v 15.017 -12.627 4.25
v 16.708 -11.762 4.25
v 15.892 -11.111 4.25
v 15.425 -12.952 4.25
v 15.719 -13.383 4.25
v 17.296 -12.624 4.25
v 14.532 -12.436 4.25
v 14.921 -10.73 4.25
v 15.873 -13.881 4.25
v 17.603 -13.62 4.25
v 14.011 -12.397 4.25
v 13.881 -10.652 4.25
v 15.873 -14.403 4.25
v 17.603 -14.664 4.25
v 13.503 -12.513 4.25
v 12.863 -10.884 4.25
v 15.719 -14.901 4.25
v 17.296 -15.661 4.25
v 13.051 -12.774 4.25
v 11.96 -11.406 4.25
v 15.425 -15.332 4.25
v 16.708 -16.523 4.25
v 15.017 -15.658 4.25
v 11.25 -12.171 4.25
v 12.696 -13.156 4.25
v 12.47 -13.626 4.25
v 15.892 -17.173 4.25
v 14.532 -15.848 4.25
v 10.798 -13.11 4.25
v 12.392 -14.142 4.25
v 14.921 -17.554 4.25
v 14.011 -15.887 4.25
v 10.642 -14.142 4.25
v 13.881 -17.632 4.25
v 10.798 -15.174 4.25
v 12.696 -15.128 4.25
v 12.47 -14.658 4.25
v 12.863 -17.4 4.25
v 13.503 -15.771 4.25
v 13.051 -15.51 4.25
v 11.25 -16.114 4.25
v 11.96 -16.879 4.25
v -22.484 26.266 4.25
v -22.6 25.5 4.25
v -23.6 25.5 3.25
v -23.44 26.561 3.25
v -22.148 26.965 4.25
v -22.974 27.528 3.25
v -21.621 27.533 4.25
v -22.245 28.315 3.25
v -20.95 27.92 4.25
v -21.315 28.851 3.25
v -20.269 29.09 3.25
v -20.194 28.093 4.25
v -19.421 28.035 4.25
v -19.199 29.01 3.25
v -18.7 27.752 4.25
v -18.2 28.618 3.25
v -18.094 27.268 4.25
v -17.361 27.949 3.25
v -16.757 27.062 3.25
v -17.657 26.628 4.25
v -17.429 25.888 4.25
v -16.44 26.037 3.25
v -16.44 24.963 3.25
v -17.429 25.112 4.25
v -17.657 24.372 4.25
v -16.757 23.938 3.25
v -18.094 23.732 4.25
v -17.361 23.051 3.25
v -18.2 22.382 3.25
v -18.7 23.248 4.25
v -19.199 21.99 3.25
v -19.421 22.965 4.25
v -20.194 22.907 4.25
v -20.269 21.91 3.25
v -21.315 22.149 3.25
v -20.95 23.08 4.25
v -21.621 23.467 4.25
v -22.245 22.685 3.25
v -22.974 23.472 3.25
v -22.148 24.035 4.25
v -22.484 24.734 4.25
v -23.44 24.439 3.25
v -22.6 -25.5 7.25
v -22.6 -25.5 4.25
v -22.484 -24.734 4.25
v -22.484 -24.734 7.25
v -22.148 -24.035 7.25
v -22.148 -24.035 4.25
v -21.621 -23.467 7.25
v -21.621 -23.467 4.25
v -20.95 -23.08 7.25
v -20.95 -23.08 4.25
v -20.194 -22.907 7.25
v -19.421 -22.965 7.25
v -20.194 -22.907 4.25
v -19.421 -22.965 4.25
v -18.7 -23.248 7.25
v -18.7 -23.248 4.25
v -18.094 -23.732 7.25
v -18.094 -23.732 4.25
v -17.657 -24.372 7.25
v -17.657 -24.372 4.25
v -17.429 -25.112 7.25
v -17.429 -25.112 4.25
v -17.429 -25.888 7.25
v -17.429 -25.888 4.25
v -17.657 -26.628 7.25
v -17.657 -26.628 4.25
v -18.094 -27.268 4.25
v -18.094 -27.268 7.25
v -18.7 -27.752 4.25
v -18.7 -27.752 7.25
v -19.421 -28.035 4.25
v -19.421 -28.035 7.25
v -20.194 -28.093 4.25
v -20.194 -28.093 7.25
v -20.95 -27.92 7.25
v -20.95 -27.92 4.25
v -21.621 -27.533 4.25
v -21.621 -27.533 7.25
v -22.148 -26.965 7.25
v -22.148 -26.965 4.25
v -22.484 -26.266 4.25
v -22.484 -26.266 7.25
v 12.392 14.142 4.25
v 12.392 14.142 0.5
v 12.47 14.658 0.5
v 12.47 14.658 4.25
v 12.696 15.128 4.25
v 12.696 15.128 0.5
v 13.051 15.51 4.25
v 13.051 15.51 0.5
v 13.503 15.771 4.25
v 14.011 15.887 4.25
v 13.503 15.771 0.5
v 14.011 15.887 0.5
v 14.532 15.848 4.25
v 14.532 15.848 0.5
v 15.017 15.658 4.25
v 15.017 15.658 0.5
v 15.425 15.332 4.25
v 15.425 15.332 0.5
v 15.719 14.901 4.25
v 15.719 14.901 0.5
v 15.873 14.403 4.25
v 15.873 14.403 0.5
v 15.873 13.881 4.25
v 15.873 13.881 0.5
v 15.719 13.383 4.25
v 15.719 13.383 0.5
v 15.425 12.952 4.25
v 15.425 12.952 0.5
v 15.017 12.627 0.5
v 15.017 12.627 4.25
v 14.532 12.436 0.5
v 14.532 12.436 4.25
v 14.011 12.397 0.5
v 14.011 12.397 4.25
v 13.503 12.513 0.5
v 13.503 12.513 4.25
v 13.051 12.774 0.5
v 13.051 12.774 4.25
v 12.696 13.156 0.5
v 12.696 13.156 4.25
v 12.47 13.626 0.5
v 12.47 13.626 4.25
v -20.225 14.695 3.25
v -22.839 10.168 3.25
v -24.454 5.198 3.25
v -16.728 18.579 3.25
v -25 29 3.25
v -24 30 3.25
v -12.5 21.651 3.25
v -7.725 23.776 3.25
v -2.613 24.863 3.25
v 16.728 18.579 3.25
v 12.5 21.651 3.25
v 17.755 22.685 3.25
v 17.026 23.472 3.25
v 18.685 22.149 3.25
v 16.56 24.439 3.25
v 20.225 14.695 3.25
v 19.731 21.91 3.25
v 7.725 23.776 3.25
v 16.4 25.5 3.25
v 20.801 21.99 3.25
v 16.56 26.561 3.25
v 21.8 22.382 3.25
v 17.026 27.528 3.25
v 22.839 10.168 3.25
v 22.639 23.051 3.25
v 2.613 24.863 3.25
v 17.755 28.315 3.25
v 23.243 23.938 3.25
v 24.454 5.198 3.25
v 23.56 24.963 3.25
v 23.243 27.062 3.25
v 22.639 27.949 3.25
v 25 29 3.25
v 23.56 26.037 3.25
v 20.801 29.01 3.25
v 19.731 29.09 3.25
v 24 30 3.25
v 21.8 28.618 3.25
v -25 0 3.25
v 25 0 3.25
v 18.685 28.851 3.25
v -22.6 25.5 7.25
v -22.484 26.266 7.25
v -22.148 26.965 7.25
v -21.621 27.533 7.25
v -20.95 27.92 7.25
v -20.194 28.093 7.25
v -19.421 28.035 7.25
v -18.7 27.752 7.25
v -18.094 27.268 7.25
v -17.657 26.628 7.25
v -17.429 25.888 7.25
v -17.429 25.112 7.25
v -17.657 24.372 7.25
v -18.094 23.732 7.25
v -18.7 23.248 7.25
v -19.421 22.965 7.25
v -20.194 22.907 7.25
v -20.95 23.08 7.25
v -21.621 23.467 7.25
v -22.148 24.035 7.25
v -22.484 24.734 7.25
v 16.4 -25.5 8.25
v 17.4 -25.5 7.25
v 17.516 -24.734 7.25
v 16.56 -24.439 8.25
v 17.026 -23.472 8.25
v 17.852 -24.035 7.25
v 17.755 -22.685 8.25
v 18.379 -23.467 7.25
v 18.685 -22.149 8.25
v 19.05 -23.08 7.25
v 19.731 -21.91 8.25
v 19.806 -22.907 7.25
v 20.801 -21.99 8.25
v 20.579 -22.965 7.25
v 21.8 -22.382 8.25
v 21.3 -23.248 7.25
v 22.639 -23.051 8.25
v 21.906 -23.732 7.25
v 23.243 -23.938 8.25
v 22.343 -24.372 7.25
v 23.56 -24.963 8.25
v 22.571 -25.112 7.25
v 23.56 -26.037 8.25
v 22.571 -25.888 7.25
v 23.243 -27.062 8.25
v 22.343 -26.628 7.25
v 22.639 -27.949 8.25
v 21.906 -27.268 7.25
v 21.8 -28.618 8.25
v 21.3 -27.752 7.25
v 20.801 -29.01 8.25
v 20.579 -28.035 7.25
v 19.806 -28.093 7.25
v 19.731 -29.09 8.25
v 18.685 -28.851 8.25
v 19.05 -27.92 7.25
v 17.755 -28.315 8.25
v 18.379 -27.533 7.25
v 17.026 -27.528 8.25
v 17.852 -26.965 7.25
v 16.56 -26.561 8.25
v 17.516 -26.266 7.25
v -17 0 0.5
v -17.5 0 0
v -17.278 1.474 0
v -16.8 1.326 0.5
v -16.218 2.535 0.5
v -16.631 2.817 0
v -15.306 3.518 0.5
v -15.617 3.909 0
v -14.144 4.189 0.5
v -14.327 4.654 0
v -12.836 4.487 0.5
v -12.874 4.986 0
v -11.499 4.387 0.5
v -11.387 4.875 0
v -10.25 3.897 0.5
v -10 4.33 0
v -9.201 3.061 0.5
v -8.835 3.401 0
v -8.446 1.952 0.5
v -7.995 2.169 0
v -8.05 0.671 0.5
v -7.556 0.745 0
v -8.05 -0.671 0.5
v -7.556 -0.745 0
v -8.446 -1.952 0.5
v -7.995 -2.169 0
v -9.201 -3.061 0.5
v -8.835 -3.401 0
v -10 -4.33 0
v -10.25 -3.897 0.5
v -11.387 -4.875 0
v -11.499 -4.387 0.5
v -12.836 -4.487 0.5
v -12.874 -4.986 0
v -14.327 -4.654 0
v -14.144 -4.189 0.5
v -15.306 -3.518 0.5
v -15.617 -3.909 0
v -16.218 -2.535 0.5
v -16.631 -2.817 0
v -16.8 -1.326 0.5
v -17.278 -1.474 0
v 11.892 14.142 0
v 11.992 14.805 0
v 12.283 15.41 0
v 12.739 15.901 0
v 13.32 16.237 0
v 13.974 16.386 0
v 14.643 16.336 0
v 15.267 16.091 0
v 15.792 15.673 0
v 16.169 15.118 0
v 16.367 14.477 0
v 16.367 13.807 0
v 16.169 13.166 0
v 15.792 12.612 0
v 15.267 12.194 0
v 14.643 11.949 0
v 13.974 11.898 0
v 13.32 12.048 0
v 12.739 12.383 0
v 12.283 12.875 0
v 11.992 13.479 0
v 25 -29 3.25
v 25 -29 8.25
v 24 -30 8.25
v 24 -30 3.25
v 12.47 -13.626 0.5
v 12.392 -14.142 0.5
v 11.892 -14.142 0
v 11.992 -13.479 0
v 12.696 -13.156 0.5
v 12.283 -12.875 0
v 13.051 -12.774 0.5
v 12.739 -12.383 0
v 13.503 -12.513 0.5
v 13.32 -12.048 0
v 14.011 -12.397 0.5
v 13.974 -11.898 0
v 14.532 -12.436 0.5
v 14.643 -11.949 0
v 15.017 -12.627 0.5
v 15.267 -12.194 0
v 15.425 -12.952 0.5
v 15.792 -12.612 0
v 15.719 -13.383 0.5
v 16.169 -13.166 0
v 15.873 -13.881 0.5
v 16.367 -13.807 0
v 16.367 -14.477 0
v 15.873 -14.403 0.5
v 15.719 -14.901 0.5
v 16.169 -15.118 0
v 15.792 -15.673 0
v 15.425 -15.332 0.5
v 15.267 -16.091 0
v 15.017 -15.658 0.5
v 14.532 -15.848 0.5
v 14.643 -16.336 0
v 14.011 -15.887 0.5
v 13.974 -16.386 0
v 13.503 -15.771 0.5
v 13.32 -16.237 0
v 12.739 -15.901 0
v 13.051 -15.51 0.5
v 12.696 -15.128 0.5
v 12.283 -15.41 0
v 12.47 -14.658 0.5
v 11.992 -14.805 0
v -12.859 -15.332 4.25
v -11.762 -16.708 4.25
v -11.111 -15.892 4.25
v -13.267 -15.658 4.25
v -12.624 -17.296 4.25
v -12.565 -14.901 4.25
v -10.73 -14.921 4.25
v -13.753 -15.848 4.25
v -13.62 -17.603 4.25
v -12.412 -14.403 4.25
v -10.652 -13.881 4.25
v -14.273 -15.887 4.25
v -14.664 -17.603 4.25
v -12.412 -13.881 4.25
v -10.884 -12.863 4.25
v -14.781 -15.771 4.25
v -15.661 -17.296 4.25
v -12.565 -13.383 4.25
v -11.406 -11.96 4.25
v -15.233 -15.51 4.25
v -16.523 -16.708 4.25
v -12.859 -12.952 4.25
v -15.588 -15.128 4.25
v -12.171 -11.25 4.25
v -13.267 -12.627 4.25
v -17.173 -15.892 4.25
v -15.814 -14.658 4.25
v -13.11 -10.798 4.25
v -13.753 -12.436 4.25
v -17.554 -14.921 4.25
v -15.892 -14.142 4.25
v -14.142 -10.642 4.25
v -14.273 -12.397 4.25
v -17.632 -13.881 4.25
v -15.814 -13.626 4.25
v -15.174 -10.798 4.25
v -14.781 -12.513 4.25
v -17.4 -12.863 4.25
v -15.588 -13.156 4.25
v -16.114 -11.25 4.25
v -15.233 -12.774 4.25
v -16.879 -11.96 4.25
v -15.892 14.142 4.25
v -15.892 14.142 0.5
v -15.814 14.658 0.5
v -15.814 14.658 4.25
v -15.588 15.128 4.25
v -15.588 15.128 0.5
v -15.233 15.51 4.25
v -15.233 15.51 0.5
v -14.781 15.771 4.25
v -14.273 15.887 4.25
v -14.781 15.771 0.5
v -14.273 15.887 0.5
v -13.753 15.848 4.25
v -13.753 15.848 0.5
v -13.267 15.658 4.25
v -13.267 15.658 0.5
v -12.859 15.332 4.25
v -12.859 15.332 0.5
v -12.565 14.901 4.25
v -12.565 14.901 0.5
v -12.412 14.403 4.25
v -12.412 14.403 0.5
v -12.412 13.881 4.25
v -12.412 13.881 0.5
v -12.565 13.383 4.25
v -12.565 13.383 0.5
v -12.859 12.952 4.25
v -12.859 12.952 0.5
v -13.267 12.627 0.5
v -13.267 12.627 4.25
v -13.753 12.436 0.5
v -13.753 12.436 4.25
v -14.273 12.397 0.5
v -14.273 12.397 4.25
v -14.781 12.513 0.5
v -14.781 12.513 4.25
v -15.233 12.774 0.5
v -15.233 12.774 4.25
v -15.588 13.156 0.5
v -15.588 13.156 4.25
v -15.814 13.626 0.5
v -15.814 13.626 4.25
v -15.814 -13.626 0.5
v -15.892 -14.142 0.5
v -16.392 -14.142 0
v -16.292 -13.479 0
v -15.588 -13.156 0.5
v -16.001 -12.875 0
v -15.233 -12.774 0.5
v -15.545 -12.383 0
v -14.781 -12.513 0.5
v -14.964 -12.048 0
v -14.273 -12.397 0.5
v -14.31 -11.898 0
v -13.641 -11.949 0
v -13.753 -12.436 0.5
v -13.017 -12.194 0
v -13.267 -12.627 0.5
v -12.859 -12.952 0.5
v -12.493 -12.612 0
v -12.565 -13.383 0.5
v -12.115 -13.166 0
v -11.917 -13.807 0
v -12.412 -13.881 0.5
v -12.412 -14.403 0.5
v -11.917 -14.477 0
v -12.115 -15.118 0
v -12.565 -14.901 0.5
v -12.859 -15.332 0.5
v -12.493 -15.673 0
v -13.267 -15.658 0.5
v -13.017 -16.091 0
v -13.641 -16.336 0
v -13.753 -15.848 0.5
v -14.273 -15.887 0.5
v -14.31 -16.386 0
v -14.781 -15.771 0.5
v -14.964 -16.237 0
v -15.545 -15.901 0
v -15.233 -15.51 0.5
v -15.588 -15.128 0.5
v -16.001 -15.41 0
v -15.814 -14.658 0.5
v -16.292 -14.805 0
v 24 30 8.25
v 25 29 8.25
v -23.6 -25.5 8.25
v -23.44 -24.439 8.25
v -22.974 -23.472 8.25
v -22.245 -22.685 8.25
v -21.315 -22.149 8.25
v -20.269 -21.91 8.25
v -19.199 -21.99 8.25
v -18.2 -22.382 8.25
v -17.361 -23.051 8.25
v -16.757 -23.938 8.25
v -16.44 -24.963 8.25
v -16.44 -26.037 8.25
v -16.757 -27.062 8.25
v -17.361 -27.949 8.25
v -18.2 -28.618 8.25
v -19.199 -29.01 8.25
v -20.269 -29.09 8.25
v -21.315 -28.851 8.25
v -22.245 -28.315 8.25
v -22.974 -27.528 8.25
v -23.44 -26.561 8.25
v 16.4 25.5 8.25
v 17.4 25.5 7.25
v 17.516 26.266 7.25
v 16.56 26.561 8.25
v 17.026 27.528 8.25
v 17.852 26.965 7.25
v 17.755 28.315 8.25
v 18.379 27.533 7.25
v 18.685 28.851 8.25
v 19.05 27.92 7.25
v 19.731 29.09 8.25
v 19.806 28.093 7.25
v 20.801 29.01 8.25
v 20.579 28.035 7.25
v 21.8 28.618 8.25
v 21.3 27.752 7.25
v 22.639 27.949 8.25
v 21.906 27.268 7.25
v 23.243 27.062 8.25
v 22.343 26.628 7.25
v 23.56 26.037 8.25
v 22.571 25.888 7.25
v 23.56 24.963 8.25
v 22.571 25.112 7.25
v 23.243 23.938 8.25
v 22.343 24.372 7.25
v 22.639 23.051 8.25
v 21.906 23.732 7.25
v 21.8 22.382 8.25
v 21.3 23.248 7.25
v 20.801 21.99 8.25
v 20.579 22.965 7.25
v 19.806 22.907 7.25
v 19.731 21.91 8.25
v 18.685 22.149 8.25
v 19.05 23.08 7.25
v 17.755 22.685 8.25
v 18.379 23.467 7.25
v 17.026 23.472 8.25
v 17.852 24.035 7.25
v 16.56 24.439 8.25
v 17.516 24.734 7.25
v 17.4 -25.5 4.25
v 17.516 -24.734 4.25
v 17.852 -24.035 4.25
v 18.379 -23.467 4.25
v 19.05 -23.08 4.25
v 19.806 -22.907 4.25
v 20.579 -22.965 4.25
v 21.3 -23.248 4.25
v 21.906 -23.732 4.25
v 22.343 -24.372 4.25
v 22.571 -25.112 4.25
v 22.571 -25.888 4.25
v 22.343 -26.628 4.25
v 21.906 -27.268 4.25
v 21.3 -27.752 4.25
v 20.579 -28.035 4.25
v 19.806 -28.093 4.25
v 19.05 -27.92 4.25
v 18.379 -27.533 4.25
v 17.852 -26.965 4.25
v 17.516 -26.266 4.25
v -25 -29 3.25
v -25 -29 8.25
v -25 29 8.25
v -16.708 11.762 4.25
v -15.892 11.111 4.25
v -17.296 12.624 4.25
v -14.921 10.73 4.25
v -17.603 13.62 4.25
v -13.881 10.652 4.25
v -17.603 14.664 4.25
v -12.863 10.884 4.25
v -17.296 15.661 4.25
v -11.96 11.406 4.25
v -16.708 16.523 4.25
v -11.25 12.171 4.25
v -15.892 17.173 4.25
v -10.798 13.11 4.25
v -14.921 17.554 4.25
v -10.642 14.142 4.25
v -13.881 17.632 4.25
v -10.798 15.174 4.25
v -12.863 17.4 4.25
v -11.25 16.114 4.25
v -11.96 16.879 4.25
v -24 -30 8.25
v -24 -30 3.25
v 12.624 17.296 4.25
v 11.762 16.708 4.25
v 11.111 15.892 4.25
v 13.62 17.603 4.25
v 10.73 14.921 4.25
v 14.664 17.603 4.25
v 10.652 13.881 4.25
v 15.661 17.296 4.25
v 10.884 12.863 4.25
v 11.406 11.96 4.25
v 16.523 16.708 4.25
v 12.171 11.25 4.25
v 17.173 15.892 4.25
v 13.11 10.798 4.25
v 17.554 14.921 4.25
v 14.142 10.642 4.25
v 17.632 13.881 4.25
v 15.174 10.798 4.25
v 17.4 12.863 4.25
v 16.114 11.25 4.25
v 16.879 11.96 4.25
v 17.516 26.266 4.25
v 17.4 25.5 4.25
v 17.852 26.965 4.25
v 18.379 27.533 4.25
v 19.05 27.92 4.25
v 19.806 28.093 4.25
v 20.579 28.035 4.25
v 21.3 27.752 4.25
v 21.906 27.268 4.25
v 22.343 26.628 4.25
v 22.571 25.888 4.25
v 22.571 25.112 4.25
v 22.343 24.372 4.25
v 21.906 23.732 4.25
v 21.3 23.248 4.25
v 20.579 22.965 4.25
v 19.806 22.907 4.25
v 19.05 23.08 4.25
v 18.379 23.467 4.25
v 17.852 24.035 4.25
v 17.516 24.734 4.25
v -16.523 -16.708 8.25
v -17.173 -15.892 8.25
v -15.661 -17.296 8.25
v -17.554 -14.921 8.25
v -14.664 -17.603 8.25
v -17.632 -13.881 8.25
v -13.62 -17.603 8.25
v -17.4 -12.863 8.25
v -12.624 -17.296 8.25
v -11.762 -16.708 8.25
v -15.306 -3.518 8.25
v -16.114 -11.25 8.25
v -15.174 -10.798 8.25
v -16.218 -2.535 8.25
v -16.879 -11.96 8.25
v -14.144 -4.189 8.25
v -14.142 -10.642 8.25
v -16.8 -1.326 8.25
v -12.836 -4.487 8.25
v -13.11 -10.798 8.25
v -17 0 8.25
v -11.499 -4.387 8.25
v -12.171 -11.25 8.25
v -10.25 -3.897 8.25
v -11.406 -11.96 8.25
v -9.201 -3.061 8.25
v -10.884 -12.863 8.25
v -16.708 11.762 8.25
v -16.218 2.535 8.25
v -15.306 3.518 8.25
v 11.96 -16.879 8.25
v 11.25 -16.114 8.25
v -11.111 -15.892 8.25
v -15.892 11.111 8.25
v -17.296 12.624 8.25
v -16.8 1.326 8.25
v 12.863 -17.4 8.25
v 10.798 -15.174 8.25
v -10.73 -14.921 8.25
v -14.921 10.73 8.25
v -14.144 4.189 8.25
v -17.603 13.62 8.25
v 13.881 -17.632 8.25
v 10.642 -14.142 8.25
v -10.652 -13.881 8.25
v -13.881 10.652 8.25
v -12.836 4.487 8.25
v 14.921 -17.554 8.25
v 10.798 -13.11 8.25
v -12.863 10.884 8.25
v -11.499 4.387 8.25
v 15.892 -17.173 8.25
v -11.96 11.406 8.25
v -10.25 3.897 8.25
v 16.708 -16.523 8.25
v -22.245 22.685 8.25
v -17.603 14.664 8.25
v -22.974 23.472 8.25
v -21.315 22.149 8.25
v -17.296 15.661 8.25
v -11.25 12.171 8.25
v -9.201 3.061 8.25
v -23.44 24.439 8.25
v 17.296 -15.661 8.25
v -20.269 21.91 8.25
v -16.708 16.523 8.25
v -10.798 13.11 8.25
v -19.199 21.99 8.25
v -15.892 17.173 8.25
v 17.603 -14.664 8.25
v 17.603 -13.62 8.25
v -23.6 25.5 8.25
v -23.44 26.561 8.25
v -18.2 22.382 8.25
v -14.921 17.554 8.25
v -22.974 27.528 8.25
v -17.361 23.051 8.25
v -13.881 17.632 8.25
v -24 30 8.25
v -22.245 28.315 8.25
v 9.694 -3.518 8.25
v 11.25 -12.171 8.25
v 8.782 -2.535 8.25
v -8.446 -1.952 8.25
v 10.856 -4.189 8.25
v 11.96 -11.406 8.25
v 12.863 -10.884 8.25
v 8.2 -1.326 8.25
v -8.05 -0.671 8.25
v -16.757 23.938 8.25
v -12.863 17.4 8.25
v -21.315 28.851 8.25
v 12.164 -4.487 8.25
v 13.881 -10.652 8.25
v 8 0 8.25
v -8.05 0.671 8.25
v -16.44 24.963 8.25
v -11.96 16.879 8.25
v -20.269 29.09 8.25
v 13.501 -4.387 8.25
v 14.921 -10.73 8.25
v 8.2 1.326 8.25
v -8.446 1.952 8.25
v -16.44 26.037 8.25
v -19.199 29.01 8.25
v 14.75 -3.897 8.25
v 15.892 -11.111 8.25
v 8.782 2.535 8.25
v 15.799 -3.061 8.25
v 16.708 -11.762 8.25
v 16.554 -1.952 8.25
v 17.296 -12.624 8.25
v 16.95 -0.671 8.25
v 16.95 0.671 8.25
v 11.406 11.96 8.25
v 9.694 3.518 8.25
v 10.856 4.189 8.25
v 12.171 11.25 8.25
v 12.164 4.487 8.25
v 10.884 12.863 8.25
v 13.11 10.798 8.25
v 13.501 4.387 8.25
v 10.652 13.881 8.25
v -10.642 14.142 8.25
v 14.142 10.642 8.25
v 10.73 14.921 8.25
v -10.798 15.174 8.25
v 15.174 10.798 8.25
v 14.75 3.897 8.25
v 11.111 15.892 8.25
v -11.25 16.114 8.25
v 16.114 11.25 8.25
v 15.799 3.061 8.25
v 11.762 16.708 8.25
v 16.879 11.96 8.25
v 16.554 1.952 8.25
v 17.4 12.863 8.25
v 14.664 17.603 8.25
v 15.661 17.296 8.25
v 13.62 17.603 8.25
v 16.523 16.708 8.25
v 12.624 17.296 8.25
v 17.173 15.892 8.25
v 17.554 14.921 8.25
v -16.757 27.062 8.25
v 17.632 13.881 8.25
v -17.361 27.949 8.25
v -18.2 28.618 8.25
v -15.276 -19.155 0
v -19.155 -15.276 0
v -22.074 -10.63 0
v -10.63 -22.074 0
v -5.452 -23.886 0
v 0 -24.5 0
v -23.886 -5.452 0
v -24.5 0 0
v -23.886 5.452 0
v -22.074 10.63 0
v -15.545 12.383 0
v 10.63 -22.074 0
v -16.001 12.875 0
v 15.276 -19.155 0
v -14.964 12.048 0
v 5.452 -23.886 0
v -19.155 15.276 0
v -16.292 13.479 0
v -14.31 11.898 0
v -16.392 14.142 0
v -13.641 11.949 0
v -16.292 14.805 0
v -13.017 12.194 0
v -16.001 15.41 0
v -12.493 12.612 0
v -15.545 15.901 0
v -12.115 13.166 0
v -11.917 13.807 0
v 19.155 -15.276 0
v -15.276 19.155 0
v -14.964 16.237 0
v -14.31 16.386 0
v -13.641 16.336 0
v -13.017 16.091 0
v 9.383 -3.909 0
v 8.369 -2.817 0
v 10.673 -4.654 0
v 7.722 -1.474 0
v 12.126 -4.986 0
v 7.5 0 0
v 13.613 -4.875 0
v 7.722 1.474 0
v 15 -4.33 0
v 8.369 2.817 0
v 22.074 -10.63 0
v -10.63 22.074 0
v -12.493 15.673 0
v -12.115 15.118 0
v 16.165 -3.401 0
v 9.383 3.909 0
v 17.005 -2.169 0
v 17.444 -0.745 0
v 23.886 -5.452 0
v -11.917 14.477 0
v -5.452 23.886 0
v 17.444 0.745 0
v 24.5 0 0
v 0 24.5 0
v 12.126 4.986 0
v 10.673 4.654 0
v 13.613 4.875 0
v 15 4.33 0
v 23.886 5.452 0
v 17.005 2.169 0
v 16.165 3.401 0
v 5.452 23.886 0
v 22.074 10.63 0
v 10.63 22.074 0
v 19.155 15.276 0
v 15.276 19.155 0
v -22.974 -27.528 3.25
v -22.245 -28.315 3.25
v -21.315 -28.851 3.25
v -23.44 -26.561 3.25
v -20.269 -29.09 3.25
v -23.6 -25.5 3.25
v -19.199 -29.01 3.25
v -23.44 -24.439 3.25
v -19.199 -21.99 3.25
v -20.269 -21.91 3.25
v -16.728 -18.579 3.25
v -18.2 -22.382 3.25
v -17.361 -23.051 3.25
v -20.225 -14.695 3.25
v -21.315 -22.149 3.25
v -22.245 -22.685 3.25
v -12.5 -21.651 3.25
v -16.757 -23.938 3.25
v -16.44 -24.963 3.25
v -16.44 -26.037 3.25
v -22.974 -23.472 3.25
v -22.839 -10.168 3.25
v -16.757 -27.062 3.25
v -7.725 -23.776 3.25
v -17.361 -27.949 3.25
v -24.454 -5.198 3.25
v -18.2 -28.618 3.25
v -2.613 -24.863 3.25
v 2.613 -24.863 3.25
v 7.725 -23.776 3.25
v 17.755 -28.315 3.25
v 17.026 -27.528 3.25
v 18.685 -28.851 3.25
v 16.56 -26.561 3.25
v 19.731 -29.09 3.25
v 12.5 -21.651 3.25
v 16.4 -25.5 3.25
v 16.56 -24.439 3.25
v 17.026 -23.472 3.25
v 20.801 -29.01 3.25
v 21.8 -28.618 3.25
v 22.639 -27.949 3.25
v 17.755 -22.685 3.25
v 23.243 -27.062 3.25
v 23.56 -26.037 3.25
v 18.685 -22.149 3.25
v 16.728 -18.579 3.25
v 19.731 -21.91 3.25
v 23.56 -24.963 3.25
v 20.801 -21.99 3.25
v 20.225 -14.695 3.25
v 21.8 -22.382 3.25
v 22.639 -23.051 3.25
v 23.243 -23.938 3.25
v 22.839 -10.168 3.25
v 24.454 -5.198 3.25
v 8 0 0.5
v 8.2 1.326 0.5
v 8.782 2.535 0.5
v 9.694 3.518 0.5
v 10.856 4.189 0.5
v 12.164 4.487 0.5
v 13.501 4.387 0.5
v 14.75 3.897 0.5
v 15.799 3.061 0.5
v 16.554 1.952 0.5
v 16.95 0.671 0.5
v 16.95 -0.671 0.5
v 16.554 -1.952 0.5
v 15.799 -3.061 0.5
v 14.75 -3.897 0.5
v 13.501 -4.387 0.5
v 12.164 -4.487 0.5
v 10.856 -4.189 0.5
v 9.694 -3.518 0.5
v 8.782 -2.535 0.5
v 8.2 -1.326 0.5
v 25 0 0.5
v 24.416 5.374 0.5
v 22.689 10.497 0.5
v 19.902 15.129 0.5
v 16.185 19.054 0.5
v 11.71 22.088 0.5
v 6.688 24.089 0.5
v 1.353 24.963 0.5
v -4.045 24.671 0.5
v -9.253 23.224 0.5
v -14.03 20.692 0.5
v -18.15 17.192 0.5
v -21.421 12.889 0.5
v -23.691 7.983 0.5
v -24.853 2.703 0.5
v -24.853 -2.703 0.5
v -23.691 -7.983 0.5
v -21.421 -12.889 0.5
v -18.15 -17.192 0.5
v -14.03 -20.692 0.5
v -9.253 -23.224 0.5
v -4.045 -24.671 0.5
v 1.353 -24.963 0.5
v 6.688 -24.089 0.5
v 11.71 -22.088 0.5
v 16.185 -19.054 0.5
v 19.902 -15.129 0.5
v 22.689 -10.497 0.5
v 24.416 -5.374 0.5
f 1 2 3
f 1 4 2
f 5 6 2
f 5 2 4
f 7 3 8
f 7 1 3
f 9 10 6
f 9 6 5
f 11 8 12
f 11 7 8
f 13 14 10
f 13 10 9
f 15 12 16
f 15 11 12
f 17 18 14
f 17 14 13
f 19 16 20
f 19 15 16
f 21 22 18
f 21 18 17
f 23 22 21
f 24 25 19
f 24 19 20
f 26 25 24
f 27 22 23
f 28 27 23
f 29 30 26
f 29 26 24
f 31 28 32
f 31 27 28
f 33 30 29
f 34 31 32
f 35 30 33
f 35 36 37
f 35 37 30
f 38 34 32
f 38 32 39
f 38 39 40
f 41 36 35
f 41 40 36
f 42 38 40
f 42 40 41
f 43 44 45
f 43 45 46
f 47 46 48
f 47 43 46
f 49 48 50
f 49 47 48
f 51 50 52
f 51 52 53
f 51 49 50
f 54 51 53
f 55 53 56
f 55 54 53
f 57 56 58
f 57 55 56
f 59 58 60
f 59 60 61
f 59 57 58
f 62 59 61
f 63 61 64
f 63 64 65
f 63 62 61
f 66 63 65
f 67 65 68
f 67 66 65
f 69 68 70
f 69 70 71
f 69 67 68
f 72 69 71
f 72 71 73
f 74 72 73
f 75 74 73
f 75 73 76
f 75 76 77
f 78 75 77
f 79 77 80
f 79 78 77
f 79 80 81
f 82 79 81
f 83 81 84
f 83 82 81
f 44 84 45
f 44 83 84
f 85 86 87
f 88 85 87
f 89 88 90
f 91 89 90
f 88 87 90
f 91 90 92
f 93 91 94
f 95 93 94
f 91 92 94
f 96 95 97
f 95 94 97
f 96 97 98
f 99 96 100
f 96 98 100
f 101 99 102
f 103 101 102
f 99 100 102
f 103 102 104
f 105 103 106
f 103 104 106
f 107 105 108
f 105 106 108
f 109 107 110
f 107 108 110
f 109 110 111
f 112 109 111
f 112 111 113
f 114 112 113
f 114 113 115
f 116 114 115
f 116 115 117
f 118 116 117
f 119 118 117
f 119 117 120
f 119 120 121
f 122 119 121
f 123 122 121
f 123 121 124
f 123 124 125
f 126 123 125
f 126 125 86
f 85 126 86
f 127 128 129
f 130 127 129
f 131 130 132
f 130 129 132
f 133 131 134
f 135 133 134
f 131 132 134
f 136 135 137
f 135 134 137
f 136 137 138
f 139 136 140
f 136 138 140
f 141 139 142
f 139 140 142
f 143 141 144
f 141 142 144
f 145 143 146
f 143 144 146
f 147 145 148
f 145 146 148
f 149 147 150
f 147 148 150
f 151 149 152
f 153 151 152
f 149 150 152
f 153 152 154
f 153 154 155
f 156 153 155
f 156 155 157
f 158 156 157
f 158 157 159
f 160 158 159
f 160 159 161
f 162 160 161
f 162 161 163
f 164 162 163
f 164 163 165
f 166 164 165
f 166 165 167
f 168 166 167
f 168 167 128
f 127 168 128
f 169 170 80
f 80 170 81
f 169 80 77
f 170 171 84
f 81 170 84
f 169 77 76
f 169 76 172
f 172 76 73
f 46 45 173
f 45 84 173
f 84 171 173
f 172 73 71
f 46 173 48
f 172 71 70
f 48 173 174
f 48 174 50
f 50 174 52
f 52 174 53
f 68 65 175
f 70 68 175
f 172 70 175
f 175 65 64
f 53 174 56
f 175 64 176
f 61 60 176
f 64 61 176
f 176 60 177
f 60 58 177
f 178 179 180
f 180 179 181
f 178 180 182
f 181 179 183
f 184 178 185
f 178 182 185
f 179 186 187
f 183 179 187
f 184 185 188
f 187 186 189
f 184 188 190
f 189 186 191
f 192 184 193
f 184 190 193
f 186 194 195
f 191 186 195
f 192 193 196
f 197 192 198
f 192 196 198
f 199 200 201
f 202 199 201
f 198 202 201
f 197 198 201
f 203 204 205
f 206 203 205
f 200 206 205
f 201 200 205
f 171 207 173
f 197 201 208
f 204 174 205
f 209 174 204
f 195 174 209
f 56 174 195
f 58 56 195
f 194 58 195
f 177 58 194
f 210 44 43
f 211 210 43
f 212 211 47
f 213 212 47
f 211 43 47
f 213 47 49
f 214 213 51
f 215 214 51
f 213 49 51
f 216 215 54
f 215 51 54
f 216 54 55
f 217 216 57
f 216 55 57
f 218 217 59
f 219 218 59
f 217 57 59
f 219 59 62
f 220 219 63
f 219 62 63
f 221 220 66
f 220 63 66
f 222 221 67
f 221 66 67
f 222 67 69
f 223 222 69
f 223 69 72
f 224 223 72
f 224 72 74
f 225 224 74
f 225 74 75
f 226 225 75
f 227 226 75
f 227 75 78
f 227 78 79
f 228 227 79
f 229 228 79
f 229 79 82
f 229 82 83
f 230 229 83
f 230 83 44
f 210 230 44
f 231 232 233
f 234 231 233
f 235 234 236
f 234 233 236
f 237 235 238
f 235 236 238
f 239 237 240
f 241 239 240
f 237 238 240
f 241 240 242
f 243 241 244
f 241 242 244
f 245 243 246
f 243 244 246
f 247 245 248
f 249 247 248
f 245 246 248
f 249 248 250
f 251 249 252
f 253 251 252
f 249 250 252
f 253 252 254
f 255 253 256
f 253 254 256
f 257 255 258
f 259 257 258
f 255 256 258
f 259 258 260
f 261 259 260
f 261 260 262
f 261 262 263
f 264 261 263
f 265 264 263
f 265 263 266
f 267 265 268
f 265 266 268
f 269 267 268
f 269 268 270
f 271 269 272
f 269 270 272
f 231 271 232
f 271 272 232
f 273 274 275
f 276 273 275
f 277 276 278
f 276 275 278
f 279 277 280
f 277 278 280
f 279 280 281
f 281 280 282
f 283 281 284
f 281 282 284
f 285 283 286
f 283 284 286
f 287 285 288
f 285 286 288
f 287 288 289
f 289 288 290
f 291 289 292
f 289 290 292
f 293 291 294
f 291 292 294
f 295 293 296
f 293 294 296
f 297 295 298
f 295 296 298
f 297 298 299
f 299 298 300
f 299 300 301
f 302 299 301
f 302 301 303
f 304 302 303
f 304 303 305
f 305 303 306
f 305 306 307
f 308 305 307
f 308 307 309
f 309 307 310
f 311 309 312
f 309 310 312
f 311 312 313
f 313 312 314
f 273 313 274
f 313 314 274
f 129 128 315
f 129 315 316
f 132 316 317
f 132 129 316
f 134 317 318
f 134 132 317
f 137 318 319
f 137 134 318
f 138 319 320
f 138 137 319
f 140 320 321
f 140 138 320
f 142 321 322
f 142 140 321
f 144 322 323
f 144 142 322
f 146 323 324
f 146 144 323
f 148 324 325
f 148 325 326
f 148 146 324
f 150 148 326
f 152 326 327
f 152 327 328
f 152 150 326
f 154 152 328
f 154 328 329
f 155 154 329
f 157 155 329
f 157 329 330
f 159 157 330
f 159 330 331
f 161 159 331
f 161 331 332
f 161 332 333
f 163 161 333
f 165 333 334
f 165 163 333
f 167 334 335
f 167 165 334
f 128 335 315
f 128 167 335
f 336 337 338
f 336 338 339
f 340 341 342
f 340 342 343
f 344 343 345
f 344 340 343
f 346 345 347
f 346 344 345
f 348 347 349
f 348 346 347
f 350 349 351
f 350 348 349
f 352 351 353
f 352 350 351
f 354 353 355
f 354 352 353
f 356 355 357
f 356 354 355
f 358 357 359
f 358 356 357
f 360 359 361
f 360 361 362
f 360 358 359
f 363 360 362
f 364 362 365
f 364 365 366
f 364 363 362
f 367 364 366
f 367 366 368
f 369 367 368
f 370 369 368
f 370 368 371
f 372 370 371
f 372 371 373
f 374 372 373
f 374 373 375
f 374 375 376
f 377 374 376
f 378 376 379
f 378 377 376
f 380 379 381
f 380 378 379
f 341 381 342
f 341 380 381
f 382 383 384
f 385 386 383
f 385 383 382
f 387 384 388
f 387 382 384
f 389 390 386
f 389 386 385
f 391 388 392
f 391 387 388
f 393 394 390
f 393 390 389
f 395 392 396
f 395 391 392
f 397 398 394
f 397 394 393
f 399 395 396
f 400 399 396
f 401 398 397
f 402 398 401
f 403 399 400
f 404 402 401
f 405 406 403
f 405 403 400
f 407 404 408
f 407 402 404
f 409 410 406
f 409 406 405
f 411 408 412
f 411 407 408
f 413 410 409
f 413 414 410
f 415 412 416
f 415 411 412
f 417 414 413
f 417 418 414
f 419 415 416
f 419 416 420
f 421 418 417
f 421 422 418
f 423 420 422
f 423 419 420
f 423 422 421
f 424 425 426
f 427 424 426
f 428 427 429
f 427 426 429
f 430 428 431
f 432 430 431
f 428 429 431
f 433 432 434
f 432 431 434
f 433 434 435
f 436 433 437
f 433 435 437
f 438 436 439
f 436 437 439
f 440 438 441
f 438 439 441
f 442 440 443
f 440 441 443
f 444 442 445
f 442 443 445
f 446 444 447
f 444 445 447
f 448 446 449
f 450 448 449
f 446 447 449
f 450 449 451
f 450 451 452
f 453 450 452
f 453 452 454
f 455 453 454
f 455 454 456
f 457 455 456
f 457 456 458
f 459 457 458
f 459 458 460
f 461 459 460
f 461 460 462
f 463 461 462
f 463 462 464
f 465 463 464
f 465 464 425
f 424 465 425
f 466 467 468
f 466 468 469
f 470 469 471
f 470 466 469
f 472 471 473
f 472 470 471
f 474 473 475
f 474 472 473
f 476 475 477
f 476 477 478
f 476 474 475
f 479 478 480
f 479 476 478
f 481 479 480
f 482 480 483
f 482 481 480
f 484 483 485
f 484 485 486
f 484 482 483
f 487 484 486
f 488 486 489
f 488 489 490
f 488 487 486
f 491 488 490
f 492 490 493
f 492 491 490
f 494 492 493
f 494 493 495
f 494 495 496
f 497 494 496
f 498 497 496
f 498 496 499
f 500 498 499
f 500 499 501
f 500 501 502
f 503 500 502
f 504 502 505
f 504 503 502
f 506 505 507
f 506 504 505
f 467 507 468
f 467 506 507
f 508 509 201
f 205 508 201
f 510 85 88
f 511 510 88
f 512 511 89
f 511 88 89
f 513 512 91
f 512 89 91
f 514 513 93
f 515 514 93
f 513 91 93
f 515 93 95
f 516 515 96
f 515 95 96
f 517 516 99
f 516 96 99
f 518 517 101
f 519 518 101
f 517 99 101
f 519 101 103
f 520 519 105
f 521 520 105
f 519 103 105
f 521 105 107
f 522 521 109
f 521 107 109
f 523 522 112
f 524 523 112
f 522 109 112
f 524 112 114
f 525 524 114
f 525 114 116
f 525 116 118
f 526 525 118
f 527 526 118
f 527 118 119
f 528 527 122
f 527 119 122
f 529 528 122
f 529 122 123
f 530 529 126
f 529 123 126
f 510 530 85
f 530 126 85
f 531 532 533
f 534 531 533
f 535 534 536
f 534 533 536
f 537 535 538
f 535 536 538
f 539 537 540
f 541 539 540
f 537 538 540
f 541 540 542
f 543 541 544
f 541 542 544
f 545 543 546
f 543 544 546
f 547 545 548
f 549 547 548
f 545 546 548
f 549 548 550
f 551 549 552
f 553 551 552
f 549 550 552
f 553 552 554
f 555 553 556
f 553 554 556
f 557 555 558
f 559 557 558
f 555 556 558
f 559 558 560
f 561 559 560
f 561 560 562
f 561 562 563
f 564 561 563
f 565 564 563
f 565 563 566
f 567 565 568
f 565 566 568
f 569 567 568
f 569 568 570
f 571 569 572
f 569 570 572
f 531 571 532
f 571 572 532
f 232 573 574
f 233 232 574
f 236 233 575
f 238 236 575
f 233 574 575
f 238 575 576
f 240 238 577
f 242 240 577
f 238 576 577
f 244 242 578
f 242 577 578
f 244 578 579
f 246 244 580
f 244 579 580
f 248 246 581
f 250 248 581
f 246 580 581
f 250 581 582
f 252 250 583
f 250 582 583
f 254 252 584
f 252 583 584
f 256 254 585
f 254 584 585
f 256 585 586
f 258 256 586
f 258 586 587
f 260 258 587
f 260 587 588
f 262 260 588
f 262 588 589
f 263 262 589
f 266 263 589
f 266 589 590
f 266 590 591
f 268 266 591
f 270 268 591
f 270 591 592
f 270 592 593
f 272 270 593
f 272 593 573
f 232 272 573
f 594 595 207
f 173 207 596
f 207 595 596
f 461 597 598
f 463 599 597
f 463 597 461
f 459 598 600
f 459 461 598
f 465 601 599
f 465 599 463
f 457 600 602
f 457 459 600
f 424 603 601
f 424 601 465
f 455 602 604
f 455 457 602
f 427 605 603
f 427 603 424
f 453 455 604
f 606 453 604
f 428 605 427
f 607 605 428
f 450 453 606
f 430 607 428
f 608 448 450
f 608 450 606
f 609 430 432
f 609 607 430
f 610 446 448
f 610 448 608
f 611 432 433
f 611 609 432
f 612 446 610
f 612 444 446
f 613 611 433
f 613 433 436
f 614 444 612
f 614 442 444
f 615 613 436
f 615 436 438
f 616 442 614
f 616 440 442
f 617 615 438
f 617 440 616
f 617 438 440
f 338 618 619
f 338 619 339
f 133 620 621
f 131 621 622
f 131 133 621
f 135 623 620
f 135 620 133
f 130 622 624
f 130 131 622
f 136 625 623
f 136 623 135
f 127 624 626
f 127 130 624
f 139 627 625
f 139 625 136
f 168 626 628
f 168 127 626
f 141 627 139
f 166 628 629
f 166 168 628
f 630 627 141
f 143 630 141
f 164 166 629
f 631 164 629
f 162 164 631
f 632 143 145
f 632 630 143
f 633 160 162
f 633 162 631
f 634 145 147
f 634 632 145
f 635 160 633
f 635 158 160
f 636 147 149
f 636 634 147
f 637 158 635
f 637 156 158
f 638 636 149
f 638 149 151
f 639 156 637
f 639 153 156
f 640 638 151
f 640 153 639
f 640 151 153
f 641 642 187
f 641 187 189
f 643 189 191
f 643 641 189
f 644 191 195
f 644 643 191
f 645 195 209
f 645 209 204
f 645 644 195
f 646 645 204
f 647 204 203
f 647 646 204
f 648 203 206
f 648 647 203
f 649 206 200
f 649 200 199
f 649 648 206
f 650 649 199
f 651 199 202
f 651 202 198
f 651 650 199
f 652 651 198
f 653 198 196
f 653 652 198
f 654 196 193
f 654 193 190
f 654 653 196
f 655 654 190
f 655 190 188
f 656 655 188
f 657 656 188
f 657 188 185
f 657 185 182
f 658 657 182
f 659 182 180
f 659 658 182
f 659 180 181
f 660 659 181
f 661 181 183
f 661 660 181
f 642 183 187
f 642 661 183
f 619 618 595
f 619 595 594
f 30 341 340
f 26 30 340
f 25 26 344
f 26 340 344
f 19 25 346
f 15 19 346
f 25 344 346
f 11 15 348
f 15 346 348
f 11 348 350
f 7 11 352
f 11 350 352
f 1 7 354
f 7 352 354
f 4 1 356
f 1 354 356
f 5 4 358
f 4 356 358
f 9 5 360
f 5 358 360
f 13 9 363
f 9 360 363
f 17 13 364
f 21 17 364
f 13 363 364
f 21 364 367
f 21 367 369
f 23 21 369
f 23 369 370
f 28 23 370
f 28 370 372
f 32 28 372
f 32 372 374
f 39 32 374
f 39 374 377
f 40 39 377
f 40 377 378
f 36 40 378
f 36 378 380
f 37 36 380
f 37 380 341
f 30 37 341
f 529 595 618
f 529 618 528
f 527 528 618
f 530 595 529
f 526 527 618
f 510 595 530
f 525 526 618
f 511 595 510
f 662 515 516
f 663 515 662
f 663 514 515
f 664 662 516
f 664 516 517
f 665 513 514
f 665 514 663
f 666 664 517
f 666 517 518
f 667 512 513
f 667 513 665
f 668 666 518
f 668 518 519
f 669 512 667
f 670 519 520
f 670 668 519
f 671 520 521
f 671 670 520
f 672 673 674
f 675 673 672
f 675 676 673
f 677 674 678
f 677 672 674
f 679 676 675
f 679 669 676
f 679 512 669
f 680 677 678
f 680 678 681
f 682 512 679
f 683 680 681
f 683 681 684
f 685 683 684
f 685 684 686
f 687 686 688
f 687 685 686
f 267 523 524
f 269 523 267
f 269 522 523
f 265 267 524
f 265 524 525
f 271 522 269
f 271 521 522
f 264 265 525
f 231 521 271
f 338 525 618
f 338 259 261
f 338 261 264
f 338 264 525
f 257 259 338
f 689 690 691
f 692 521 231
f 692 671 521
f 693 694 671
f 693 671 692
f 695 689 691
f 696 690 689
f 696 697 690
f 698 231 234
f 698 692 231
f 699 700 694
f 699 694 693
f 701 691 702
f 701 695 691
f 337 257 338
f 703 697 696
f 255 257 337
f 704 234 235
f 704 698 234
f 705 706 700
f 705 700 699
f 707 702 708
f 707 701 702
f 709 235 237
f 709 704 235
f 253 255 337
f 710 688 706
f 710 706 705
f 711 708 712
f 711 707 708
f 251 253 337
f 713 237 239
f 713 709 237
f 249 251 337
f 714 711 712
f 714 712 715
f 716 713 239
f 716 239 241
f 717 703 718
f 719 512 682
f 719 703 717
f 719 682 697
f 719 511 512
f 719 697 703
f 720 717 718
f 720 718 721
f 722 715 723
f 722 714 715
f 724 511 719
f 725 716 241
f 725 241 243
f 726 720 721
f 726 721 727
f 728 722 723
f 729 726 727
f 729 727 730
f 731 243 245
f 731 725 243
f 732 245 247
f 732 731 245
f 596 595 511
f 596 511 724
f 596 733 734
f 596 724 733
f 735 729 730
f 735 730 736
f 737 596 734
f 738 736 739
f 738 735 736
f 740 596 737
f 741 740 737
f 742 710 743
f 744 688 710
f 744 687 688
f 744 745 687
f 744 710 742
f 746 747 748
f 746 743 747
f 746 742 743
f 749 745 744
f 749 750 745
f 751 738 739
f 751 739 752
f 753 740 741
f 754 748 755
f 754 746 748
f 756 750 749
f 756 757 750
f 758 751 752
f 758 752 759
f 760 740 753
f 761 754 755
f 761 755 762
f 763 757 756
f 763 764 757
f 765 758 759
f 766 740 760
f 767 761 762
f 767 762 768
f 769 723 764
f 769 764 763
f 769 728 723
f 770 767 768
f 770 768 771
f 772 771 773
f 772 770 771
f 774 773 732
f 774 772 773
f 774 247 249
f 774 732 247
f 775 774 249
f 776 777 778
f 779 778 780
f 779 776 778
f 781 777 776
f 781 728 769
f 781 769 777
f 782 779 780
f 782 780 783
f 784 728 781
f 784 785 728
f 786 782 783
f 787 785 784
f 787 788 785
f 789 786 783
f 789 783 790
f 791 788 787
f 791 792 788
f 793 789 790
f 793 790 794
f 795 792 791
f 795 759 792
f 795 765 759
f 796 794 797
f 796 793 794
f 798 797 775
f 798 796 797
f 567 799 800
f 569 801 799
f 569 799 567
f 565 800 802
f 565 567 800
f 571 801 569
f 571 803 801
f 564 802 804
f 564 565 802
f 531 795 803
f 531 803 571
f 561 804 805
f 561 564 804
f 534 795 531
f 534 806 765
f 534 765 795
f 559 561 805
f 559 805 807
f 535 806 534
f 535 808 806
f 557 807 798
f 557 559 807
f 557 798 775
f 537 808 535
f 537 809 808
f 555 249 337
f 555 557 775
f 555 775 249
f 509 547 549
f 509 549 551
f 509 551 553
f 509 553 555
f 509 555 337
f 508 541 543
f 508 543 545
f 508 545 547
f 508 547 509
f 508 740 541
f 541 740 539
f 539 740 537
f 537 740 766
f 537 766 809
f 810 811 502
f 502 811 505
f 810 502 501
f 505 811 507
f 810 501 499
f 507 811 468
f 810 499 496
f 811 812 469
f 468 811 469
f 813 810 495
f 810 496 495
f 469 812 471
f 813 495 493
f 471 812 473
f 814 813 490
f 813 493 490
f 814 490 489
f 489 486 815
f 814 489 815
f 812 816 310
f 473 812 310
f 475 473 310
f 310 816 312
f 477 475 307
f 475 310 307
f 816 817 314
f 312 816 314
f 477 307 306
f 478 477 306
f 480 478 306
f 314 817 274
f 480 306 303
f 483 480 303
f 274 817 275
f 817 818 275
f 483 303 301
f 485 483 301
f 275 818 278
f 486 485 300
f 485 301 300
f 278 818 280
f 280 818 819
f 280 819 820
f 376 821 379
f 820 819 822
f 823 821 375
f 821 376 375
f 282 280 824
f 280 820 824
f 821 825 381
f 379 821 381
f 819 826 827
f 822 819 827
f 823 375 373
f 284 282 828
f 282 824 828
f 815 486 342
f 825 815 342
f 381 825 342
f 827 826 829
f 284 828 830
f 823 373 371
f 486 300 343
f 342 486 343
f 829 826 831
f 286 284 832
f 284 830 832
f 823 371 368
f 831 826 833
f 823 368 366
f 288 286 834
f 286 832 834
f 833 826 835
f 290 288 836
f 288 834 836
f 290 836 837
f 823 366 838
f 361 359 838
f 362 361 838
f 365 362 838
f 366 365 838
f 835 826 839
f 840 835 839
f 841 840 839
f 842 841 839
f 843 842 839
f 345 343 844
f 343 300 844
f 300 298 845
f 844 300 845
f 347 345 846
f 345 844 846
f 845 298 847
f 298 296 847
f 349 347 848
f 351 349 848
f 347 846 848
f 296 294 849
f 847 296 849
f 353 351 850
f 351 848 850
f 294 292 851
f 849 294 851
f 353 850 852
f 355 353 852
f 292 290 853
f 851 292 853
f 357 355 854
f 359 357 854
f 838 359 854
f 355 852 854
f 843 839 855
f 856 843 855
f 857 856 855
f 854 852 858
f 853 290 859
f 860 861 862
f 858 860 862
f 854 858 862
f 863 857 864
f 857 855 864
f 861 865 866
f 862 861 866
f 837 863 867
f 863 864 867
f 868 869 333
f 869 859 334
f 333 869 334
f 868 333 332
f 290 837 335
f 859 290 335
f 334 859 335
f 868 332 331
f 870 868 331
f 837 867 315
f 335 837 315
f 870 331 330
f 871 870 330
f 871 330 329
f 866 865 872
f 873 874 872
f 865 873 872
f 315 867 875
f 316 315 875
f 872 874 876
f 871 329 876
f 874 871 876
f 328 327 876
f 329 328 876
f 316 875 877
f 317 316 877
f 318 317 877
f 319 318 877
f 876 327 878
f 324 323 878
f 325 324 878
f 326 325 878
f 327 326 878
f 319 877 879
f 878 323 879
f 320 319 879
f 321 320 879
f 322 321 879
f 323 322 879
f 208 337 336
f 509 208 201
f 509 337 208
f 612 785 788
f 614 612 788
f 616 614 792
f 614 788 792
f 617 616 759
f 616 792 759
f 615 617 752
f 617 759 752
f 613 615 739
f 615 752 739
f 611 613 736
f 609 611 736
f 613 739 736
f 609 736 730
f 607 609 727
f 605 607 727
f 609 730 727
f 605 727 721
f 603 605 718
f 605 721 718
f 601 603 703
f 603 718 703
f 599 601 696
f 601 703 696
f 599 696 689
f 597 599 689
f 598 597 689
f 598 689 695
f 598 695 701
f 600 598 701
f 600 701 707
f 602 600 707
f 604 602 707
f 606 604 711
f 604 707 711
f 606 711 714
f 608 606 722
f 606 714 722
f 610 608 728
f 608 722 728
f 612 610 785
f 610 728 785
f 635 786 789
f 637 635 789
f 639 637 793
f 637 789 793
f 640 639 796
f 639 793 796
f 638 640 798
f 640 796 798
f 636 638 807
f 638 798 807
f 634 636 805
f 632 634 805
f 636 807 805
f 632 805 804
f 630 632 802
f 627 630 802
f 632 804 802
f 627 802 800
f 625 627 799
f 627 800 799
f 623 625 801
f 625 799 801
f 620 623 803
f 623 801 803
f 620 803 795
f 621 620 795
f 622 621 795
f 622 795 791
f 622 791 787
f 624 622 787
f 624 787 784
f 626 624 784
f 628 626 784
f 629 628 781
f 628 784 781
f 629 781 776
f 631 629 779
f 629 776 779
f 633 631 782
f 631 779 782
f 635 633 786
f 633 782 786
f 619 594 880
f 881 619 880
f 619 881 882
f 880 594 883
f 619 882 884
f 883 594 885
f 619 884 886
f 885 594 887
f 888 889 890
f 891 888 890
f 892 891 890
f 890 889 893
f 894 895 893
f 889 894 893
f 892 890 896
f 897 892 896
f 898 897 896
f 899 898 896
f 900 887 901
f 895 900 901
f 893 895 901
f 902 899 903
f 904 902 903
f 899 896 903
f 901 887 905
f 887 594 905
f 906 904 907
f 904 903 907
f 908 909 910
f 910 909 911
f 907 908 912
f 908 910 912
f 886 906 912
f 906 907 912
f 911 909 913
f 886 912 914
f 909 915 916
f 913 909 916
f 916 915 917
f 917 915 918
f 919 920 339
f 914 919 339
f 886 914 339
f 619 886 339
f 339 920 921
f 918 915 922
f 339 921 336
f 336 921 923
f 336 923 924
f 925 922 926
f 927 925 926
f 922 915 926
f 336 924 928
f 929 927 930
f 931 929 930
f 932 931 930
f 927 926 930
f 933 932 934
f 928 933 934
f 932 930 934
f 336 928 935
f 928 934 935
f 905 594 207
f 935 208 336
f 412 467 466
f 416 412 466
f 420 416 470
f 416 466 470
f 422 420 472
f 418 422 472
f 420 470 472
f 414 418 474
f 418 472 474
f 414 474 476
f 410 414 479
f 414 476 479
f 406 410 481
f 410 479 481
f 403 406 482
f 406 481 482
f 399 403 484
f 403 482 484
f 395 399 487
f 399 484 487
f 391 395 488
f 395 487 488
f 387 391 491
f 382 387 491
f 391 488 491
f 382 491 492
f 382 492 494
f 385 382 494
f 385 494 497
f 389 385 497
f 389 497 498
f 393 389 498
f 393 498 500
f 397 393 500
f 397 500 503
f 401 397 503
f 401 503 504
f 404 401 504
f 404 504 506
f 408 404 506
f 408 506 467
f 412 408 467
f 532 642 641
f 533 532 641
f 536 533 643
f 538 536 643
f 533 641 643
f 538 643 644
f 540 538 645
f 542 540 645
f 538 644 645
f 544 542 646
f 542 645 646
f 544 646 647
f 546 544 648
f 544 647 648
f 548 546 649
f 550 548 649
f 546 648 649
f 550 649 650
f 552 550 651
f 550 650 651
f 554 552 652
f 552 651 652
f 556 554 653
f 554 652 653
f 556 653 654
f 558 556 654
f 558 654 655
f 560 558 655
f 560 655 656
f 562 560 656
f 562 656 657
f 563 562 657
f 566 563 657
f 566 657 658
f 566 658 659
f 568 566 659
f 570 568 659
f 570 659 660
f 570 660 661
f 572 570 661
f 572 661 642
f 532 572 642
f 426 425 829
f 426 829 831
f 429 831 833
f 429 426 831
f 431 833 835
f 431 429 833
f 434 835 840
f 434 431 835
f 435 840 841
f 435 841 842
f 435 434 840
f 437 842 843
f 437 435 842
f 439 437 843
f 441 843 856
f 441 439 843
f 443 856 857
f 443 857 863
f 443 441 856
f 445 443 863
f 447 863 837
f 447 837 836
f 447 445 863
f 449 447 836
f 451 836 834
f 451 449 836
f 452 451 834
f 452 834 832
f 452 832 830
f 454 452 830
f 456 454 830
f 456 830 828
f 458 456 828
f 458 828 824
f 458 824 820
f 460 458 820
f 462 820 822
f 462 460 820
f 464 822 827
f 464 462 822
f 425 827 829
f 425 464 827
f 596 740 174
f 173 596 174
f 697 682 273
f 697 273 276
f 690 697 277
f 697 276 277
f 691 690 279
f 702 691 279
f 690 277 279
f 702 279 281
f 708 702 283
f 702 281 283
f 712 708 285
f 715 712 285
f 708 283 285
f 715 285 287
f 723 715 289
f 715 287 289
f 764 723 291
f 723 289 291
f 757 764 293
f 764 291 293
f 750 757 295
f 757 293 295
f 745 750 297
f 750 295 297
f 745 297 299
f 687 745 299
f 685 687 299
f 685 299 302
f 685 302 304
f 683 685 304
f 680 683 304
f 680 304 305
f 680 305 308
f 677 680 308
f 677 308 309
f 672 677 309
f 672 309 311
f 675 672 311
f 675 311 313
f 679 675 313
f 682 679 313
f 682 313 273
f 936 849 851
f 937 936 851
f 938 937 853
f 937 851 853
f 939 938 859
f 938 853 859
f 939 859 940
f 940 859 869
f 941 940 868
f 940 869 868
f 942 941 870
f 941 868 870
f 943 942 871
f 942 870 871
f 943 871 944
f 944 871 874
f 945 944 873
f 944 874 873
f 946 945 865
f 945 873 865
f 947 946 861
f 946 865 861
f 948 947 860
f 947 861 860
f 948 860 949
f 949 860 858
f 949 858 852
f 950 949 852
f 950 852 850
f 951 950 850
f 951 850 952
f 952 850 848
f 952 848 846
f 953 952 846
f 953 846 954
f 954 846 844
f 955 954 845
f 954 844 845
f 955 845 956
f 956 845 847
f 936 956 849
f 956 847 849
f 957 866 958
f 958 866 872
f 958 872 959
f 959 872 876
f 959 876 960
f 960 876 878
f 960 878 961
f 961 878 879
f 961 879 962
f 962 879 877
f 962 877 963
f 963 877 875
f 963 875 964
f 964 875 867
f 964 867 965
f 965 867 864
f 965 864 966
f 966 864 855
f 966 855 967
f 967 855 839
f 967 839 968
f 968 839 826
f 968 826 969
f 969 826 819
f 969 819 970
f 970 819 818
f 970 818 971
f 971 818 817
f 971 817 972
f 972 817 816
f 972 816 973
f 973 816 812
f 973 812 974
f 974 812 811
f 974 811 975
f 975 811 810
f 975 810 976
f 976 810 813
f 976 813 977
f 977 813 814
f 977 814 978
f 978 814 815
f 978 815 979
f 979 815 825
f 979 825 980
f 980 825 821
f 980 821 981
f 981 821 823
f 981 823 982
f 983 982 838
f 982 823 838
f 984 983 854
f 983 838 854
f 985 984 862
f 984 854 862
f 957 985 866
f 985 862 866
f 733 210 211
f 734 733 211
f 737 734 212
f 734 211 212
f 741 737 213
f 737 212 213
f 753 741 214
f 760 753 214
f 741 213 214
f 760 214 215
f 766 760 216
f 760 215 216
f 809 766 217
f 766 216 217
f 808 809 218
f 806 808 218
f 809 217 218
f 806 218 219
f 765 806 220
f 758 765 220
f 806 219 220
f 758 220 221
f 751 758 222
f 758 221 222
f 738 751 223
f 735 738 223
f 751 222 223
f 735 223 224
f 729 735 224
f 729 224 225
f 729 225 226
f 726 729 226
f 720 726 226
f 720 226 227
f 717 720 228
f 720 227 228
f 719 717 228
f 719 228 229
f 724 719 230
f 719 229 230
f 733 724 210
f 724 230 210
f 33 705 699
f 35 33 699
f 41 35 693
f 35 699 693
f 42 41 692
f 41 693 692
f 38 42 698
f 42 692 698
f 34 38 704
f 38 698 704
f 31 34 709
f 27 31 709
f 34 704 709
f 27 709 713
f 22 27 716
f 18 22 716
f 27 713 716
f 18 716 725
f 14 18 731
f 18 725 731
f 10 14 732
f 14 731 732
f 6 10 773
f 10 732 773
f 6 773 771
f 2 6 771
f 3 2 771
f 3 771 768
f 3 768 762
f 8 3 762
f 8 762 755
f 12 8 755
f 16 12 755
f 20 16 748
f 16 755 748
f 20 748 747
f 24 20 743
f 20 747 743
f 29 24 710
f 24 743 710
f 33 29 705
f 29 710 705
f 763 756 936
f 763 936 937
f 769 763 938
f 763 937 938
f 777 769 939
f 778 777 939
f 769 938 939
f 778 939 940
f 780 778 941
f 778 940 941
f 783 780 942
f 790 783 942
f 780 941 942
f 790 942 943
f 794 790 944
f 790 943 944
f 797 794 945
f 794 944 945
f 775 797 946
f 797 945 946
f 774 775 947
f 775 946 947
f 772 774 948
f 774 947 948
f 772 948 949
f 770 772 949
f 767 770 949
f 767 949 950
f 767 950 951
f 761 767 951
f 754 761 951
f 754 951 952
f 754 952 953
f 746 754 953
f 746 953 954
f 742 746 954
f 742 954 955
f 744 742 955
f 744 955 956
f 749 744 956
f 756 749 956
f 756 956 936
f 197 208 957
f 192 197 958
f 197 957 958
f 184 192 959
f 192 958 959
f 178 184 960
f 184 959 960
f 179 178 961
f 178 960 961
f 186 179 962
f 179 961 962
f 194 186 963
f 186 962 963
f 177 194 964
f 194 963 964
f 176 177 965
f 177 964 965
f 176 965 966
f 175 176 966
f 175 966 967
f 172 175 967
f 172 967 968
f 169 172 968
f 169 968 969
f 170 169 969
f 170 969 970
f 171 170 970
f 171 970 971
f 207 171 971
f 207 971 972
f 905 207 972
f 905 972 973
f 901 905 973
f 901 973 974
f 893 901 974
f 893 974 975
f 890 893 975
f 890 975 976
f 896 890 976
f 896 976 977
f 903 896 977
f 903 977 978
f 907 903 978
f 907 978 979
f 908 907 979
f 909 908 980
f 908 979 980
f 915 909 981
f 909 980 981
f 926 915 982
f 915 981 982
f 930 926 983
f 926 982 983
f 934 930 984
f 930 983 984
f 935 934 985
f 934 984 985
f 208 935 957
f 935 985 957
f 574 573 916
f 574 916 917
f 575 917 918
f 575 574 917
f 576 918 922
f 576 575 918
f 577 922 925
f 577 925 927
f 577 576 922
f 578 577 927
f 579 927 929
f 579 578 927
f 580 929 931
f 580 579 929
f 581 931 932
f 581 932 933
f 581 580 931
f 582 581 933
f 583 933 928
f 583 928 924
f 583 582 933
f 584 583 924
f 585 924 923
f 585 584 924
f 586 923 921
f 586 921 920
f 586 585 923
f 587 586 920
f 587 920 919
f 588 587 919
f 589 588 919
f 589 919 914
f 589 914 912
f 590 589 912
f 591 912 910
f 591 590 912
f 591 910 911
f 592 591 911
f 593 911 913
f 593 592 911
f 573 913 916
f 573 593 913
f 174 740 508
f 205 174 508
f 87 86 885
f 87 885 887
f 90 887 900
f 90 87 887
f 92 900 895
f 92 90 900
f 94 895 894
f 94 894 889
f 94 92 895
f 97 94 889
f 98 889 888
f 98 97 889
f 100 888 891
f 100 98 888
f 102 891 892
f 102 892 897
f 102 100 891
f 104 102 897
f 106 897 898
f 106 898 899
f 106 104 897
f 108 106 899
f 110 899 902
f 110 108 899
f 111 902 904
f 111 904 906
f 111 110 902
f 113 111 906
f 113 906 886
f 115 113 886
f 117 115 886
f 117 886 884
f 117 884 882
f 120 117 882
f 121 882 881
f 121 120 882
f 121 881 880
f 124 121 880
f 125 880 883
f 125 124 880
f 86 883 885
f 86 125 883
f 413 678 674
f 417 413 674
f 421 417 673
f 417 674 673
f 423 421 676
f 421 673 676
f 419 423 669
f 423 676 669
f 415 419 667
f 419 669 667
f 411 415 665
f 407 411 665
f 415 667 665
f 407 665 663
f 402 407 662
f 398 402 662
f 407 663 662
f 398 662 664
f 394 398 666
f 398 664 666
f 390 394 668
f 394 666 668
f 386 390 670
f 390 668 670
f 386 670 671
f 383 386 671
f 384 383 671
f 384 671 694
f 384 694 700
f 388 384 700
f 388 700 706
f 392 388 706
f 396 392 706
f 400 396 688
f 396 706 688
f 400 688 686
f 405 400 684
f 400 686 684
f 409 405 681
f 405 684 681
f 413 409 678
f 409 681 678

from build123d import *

# Parameters (mm, degrees)
SKETCH1_R           = 25
BOSS_EXTRUDE1_DEPTH = 8.25
SKETCH2_W           = 50
SKETCH2_H           = 50
BOSS_EXTRUDE2_DEPTH = 5
SKETCH3_R           = 4.5
SKETCH3_R_2         = 1.75
CUT_EXTRUDE1_DEPTH  = 37.305130491
SKETCH5_R           = 3.5
CUT_EXTRUDE3_DEPTH  = 4
CIRPATTERN2_COUNT   = 4
CHAMFER2_SIZE       = 0.5
SKETCH6_W           = 50
SKETCH6_H           = 5
BOSS_EXTRUDE3_DEPTH = 5
SKETCH7_R           = 2.6
CUT_EXTRUDE4_DEPTH  = 40.37003937
CHAMFER3_SIZE       = 1


with BuildPart() as part:
    # Sketch1 → Boss-Extrude1 (new body)
    with BuildSketch(Plane.XY):
        Circle(SKETCH1_R)
    extrude(amount=BOSS_EXTRUDE1_DEPTH)

    # Sketch2 → Boss-Extrude2 (add)
    with BuildSketch(Plane.XY.offset(8.25)):
        Rectangle(SKETCH2_W, SKETCH2_H)
    extrude(amount=-BOSS_EXTRUDE2_DEPTH)

    # Sketch3 → Cut-Extrude1 (cut, through all)
    with BuildSketch(Plane(origin=(0, 0, 0), x_dir=(-1, 0, 0), z_dir=(0, 0, -1))):
        with Locations((12.5, 0)):
            Circle(SKETCH3_R)
        with Locations((-12.5, 0)):
            Circle(SKETCH3_R)
        with Locations((-14.142135624, 14.142135624)):
            Circle(SKETCH3_R_2)
        with Locations((14.142135624, 14.142135624)):
            Circle(SKETCH3_R_2)
        with Locations((14.142135624, -14.142135624)):
            Circle(SKETCH3_R_2)
        with Locations((-14.142135624, -14.142135624)):
            Circle(SKETCH3_R_2)
    extrude(amount=-CUT_EXTRUDE1_DEPTH, mode=Mode.SUBTRACT)

    # Sketch5 → Cut-Extrude3 (cut)
    with BuildSketch(Plane.XY.offset(8.25)):
        with Locations((-14.142135624, 14.142135624)):
            Circle(SKETCH5_R)
    cut_extrude3 = extrude(amount=-CUT_EXTRUDE3_DEPTH, mode=Mode.SUBTRACT)

    # CirPattern2: Cut-Extrude3 ×4 about axis
    cirpattern2_axis = Axis((0, 0, 0), (0, 0, 1))
    for i in range(1, CIRPATTERN2_COUNT):
        add(cut_extrude3.rotate(cirpattern2_axis, i * 360 / CIRPATTERN2_COUNT), mode=Mode.SUBTRACT)

    # Chamfer2
    chamfer2_edges = [part.edges().sort_by_distance(p)[0] for p in [
        (-25, 0, 0),
        (17, 0, 0),
        (15.892135624, 14.142135624, 0),
        (-12.392135624, 14.142135624, 0),
        (-12.392135624, -14.142135624, 0),
        (15.892135624, -14.142135624, 0),
        (-8, 0, 0),
    ]]
    chamfer(chamfer2_edges, length=CHAMFER2_SIZE)

    # Sketch6 → Boss-Extrude3 (add)
    with BuildSketch(Plane.XY.offset(8.25)):
        with Locations((0, 27.5)):
            Rectangle(SKETCH6_W, SKETCH6_H)
        with Locations((0, -27.5)):
            Rectangle(SKETCH6_W, SKETCH6_H)
    extrude(amount=-BOSS_EXTRUDE3_DEPTH)

    # Sketch7 → Cut-Extrude4 (cut, through all)
    with BuildSketch(Plane(origin=(0, 0, 3.25), x_dir=(-1, 0, 0), z_dir=(0, 0, -1))):
        with Locations((-20, 25.5)):
            Circle(SKETCH7_R)
        with Locations((20, 25.5)):
            Circle(SKETCH7_R)
        with Locations((20, -25.5)):
            Circle(SKETCH7_R)
        with Locations((-20, -25.5)):
            Circle(SKETCH7_R)
    extrude(amount=-CUT_EXTRUDE4_DEPTH, mode=Mode.SUBTRACT)

    # Chamfer3
    chamfer3_edges = [part.edges().sort_by_distance(p)[0] for p in [
        (-25, 30, 5.75),
        (25, 30, 5.75),
        (-25, -30, 5.75),
        (25, -30, 5.75),
        (22.6, -25.5, 8.25),
        (22.6, -25.5, 3.25),
        (-17.4, -25.5, 8.25),
        (-17.4, -25.5, 3.25),
        (-17.4, 25.5, 8.25),
        (-17.4, 25.5, 3.25),
        (22.6, 25.5, 8.25),
        (22.6, 25.5, 3.25),
    ]]
    chamfer(chamfer3_edges, length=CHAMFER3_SIZE)


solid = part.part
